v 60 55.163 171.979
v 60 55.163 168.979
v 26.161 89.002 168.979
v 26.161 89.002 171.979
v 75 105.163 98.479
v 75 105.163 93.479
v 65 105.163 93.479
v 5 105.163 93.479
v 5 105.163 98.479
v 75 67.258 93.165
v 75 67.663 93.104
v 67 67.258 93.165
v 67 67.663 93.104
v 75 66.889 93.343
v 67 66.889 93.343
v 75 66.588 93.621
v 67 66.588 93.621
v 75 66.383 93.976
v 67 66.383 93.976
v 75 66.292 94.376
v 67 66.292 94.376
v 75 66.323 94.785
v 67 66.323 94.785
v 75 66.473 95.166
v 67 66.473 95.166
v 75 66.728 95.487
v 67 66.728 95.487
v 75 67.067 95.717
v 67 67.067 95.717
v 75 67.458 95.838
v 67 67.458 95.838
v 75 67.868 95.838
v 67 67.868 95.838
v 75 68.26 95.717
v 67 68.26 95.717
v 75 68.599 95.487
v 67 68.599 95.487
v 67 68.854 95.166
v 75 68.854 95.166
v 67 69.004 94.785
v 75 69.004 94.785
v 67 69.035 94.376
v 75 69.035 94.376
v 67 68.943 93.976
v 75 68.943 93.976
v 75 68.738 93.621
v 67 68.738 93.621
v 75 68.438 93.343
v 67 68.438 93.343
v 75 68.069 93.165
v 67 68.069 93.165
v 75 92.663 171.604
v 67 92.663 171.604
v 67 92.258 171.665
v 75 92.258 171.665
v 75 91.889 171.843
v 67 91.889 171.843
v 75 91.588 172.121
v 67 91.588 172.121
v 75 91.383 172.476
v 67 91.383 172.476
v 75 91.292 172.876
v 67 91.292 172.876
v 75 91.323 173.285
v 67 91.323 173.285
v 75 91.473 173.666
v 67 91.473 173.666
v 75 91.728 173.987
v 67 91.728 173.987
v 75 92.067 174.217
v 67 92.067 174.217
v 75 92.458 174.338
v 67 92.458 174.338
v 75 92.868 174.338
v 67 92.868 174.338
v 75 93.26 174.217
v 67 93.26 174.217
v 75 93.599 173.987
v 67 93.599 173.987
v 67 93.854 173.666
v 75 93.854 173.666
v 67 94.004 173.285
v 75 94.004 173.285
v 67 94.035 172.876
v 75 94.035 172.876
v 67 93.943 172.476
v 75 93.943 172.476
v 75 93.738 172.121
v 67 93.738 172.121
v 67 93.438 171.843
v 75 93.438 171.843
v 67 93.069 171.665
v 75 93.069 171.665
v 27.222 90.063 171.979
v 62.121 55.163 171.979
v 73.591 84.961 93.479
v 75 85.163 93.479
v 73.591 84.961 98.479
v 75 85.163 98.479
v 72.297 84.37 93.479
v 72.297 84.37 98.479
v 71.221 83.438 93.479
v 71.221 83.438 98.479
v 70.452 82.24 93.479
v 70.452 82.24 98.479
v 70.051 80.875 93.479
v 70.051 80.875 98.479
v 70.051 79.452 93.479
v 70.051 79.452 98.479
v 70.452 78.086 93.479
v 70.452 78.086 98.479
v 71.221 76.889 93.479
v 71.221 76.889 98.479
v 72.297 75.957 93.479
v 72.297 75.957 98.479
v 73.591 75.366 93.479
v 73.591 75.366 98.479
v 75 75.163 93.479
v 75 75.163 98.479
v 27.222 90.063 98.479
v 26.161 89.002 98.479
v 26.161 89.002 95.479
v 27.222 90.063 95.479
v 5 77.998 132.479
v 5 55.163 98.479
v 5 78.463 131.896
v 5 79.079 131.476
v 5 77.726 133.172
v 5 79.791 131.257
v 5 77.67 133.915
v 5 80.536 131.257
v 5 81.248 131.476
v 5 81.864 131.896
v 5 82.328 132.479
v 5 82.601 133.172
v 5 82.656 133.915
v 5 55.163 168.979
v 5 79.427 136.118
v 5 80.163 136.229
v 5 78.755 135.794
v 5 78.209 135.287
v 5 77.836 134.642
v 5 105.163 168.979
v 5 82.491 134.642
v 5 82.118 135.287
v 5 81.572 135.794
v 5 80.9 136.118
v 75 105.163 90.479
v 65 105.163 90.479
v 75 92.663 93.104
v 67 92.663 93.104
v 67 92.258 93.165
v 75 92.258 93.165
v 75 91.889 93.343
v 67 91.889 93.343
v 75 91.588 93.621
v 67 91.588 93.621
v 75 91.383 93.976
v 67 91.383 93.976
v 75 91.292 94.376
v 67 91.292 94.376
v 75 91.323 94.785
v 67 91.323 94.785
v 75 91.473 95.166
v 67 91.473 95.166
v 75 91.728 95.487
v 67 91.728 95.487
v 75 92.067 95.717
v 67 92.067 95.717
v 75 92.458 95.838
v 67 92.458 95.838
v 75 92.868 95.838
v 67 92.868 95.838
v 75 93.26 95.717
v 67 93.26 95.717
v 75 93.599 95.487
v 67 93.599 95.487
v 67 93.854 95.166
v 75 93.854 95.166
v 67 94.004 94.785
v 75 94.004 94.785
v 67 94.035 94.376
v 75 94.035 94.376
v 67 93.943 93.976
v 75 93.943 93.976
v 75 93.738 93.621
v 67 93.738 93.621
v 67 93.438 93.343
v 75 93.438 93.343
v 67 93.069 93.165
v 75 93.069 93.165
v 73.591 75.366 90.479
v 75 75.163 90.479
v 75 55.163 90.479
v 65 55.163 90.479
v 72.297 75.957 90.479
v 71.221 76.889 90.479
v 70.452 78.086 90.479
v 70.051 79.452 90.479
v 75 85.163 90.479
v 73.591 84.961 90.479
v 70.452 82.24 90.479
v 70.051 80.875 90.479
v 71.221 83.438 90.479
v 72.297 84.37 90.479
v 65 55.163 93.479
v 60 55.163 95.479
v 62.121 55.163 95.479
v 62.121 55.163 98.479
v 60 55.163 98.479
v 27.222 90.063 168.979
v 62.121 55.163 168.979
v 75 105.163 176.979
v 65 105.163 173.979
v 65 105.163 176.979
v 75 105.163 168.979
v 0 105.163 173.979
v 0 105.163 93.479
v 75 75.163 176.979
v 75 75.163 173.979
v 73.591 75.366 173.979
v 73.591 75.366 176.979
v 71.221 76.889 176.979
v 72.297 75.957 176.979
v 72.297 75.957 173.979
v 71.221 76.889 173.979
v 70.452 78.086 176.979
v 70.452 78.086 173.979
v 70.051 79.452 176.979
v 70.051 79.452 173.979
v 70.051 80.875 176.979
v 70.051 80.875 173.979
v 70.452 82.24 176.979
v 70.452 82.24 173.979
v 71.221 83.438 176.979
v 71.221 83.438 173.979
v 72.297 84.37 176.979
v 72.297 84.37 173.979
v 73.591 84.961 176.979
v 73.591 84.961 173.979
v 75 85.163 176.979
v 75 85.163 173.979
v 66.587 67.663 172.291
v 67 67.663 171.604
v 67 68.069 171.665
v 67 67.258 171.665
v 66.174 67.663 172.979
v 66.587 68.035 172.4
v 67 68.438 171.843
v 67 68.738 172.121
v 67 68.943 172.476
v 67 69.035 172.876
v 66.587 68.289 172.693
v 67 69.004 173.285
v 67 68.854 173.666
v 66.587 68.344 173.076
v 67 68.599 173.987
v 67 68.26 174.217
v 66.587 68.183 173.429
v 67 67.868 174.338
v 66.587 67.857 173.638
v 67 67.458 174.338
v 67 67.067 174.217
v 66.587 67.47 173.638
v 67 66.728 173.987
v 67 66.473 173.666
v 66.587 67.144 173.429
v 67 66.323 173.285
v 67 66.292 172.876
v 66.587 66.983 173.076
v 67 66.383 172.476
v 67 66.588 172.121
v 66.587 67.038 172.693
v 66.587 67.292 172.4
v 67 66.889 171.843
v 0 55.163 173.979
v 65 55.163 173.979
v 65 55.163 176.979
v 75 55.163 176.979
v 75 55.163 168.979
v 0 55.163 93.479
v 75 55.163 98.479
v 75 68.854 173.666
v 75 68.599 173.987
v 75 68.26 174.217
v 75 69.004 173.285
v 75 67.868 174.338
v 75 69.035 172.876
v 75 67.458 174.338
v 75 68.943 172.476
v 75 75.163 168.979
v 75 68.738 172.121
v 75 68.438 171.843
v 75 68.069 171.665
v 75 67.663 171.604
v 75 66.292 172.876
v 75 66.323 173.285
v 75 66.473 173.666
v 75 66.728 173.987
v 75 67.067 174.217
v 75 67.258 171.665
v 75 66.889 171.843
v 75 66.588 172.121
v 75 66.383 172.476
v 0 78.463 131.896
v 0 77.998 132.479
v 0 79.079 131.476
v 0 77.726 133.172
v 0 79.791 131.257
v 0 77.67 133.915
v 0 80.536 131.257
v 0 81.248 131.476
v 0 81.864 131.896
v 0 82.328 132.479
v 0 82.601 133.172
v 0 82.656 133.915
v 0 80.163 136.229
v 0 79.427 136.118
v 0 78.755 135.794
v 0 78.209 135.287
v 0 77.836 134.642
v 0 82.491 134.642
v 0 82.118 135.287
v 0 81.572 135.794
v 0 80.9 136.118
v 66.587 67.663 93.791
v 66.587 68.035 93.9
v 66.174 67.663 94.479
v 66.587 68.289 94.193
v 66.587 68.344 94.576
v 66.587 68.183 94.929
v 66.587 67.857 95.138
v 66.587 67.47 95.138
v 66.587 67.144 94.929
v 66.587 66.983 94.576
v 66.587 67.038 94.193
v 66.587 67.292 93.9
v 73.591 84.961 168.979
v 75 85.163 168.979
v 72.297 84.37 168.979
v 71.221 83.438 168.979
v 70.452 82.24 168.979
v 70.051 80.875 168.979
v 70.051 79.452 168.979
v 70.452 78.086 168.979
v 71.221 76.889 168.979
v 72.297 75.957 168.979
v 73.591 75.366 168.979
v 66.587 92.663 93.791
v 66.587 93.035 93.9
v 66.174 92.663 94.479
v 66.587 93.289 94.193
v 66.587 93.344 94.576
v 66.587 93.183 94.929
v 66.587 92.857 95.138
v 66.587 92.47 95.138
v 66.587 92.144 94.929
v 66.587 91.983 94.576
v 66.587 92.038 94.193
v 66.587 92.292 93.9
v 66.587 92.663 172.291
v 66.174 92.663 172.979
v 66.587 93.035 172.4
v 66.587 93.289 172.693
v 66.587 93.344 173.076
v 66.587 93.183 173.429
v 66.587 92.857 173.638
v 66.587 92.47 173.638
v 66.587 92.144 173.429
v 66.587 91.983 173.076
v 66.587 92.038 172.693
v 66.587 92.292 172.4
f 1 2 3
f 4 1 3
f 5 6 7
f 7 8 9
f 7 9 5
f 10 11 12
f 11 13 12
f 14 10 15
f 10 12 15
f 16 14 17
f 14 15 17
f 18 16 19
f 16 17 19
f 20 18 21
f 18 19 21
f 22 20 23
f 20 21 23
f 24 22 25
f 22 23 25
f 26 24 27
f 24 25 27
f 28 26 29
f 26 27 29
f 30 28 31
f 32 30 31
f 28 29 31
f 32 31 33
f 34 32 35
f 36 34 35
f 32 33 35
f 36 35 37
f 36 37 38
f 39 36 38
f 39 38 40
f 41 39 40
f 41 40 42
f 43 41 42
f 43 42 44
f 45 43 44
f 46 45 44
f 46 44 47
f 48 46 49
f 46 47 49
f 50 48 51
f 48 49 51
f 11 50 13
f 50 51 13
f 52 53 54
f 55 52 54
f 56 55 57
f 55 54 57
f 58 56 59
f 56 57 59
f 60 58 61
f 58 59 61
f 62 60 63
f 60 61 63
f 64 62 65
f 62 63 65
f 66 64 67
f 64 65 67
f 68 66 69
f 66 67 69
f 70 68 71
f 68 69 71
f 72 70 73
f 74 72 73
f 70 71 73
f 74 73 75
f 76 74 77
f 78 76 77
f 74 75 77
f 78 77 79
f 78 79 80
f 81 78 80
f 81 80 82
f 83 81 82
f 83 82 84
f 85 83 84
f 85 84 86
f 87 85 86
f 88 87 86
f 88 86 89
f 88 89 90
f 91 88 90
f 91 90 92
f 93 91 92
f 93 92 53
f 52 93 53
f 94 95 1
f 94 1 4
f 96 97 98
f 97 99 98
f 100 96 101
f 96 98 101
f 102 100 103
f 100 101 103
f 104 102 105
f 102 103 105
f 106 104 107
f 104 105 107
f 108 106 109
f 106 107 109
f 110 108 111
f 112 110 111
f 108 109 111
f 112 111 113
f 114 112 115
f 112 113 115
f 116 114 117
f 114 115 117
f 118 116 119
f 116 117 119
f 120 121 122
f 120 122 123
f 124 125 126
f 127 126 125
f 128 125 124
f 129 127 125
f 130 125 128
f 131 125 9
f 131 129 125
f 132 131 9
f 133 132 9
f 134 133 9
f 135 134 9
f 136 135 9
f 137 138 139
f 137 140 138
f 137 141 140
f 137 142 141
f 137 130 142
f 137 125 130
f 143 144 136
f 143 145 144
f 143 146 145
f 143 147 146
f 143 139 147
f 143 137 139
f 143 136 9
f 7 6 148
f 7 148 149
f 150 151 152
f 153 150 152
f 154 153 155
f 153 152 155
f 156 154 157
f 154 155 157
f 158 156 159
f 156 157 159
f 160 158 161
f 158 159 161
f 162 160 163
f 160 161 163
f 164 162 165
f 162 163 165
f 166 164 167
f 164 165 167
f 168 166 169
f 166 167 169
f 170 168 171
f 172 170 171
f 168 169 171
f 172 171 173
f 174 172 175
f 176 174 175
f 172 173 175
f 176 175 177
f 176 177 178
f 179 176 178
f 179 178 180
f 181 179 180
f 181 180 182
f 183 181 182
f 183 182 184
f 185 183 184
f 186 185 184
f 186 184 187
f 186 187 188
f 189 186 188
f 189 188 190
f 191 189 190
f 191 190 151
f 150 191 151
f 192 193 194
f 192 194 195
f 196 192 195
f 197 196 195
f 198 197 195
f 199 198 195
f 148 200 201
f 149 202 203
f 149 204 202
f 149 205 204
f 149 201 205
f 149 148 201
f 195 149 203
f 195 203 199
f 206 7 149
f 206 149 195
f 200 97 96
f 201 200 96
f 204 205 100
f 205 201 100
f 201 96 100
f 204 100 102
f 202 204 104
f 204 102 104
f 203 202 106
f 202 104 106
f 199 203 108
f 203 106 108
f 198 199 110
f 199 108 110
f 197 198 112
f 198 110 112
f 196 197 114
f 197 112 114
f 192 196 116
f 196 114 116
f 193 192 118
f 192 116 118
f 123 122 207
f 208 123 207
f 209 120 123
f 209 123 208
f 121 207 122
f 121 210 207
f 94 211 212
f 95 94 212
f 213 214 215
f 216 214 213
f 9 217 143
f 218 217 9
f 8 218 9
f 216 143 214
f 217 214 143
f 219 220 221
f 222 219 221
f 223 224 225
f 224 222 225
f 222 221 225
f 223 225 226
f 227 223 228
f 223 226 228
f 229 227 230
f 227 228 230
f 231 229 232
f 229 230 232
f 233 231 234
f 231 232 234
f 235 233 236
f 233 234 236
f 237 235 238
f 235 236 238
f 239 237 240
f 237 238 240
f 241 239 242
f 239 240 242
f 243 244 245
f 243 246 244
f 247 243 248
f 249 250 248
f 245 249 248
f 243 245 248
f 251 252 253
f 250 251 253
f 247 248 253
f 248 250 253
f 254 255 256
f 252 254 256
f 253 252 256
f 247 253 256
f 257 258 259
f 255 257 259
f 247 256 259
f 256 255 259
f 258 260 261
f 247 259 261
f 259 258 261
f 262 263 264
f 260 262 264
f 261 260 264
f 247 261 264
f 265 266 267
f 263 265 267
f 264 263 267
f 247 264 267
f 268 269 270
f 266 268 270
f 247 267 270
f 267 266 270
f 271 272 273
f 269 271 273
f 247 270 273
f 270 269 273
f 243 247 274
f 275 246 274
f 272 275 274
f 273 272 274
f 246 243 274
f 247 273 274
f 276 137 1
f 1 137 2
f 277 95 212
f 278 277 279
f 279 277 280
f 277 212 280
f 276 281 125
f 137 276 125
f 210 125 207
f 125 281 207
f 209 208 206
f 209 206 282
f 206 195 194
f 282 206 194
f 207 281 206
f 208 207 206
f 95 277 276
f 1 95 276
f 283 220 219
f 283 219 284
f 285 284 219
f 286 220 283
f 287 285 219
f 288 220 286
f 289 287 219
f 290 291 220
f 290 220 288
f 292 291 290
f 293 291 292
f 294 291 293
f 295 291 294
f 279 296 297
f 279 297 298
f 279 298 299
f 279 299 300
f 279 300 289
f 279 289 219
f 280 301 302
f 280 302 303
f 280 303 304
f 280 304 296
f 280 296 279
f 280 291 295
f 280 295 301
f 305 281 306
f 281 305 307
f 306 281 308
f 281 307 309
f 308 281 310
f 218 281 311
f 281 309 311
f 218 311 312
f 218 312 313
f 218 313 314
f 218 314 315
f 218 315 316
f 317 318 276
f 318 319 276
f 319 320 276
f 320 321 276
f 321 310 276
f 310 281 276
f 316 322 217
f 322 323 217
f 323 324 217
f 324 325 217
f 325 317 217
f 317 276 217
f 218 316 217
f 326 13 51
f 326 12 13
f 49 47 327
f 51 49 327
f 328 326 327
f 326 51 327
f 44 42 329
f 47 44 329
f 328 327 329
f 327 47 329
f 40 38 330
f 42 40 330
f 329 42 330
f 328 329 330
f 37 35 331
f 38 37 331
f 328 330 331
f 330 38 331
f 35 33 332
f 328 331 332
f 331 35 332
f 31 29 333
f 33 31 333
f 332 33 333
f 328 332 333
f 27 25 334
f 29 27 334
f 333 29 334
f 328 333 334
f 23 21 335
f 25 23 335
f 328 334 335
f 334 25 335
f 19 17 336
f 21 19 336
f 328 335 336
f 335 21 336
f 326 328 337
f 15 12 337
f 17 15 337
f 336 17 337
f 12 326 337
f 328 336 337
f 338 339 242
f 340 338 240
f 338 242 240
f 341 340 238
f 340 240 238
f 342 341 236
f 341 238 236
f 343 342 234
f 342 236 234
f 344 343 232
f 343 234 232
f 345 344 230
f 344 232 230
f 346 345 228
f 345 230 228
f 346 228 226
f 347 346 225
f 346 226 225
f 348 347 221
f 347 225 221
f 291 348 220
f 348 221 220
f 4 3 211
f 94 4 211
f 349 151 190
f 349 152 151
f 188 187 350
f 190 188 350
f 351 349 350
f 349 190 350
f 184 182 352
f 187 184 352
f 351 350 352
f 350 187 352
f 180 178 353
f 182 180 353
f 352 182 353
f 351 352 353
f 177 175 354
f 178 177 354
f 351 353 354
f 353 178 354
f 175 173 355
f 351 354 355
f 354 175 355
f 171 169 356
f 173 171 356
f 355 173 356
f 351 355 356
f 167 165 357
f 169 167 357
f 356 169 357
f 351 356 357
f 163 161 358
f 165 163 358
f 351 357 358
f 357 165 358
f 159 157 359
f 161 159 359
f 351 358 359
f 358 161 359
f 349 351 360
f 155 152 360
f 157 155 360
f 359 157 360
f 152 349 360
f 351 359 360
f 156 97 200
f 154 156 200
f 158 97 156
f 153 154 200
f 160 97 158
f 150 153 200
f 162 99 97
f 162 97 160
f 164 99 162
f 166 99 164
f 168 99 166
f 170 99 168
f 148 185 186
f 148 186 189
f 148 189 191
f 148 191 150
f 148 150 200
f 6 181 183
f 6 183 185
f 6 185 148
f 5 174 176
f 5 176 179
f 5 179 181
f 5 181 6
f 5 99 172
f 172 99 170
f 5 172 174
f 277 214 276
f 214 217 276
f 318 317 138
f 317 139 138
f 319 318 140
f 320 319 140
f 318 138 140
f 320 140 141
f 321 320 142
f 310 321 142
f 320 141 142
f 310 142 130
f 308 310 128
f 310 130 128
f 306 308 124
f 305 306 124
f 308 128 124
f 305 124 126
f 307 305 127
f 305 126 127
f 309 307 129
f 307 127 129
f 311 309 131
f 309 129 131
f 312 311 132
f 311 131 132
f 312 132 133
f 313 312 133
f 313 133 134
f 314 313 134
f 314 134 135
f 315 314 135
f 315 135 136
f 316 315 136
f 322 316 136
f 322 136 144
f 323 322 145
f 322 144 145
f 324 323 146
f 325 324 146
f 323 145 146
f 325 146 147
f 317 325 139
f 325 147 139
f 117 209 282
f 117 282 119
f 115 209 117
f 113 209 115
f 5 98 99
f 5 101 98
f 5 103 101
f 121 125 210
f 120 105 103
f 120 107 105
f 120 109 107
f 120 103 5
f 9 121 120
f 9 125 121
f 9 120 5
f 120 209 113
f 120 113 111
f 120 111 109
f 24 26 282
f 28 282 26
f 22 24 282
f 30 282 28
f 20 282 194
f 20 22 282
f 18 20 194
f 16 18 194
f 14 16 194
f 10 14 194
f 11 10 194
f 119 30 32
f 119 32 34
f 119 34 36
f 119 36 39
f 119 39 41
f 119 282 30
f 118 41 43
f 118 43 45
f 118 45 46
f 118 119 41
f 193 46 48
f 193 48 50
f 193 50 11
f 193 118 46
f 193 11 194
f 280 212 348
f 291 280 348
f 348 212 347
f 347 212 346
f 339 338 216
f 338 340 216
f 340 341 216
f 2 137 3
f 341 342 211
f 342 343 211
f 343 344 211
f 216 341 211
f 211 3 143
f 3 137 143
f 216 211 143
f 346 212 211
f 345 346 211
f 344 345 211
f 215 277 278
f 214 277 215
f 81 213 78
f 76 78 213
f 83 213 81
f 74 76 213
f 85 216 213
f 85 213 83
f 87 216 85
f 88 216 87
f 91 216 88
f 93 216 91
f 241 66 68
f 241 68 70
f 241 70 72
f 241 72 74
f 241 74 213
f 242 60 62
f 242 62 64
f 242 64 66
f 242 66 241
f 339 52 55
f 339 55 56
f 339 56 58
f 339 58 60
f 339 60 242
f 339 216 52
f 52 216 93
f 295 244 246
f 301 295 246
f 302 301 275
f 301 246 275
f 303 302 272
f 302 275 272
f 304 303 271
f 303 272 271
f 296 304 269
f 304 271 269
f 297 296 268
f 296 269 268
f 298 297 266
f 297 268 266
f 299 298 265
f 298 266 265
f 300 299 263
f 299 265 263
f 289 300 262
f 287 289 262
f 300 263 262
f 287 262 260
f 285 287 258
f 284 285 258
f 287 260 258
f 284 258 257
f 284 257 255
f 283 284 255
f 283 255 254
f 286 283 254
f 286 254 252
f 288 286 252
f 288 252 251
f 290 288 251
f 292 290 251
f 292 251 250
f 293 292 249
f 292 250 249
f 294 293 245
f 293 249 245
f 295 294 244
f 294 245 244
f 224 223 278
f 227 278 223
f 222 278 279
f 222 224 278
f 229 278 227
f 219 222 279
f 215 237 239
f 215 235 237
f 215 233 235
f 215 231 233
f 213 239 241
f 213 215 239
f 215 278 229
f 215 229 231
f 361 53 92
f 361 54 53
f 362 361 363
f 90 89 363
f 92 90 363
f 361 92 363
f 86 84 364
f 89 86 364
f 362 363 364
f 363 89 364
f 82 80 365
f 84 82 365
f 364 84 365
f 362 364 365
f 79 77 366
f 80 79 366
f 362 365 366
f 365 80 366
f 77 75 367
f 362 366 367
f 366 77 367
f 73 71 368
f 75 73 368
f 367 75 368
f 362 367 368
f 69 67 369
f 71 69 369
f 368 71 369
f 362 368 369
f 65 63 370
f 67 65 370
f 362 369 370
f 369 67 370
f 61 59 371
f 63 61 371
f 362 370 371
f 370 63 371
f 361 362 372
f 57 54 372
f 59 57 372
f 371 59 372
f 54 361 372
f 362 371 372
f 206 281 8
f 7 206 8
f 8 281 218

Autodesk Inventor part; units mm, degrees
ref_plane "YZ Plane" through (0, 0, 0) normal (1, 0, 0) x (0, 1, 0)
ref_plane "XZ Plane" through (0, 0, 0) normal (0, 1, 0) x (-1, 0, 0)
ref_plane "XY Plane" through (0, 0, 0) normal (0, 0, 1) x (1, 0, 0)
sketch "Skizze1" plane through (0, 0, 0) normal (1, 0, 0) x (0, 1, 0)
  line L0 (105.1634, 173.9786) -> (55.1634, 173.9786)
  line L1 (55.1634, 173.9786) -> (55.1634, 93.4786)
  line L2 (55.1634, 93.4786) -> (105.1634, 93.4786)
  line L3 (105.1634, 93.4786) -> (105.1634, 173.9786)
  point P0 (0, 0)
  dimension "d0" = 80.5
  dimension "d1" = 50
extrude "Extrusion1" add sketch "Skizze1" along normal blind 5
sketch "Skizze2" plane through (5, 0, 0) normal (1, 0, 0) x (0, 0, -1)
  line L0 (-173.9786, 105.1639) -> (-168.9786, 105.1634)
  line L1 (-93.4786, 105.1634) -> (-173.9786, 105.1634) projected
  line L2 (-173.9786, 55.1634) -> (-93.4786, 55.1634) projected
  line L3 (-168.9786, 55.1634) -> (-173.9786, 55.1634)
  line L4 (-173.9786, 55.1634) -> (-173.9786, 105.1639)
  line L5 (-168.9786, 105.1634) -> (-168.9786, 55.1634)
  line L6 (-93.4786, 105.1634) -> (-98.4786, 105.1634)
  line L7 (-98.4786, 55.1634) -> (-93.4786, 55.1634)
  line L8 (-93.4786, 55.1634) -> (-93.4786, 105.1634) projected
  line L9 (-93.4786, 105.1634) -> (-98.4786, 105.1634)
  line L10 (-98.4786, 55.1634) -> (-98.4786, 105.1634)
  line L11 (-98.4786, 105.1634) -> (-93.4786, 105.1634)
  line L12 (-93.4786, 55.1634) -> (-98.4786, 55.1634)
  line L13 (-98.4786, 105.1634) -> (-93.4786, 105.1634)
  line L14 (-93.4786, 55.1634) -> (-98.4786, 55.1634)
  line L15 (-98.4786, 105.1634) -> (-93.4786, 105.1634)
  point P0 (0, 0)
  dimension "d4" = 5
  dimension "d5" = 5
extrude "Extrusion2" add sketch "Skizze2" along normal blind 70 contours L1 L8 L2 L10
sketch "Skizze3" plane through (5, 55.1634, 98.4786) normal (0, 0, 1) x (1, 0, 0)
  line L0 (22.2218, 34.8995) -> (57.5772, -0.4558)
  line L1 (57.5772, -0.4558) -> (56.5165, -1.5165)
  line L2 (56.5165, -1.5165) -> (21.1612, 33.8388)
  line L3 (21.1612, 33.8388) -> (22.2218, 34.8995)
  line L4 (-5, 50) -> (-5, 0) projected
  line L5 (21.1612, 33.8388) -> (38.8388, 16.1612)
  line L6 (0, 50) -> (70, 50) projected
  line L7 (57.5772, -0.4558) -> (56.5165, -1.5165)
  line L8 (56.5165, -1.5165) -> (57.5772, -0.4558)
  line L9 (51.6127, 5.5086) -> (50.5521, 4.4479)
  line L10 (50.5521, 4.4479) -> (56.5165, -1.5165)
  line L11 (57.5772, -0.4558) -> (51.6127, 5.5086)
  point P0 (-5, -55.1634)
  dimension "d8" = 1.5
  dimension "d9" = 50
  dimension "d10" = 45
  dimension "d35" = 16.1612
  dimension "d36" = 26.1612
sketch "Skizze4" plane through (0, 105.1634, 173.9786) normal (0, 1, 0) x (1, 0, 0)
  point P0 (0, 173.9786)
extrude "Extrusion3" cut sketch "Skizze3" against normal blind 3
sketch "Skizze5" plane through (5, 0, 0) normal (1, 0, 0) x (0, 0, -1)
  line L0 (-173.9786, 105.1634) -> (-173.9786, 55.1634) projected
  line L1 (-173.9786, 55.1634) -> (-168.9786, 55.1634)
  line L2 (-173.9786, 55.1634) -> (-98.4786, 55.1634) projected
  line L3 (-98.4786, 105.1634) -> (-173.9786, 105.1634) projected
  line L4 (-168.9786, 105.1634) -> (-173.9786, 105.1634)
  line L5 (-173.9786, 105.1634) -> (-173.9786, 55.1634)
  line L6 (-168.9786, 55.1634) -> (-168.9786, 105.1634)
  point P0 (0, 0)
  dimension "d15" = 5
extrude "Extrusion4" add sketch "Skizze5" along normal blind 70
sketch "Skizze6" plane through (5, 55.1634, 168.9786) normal (0, 0, -1) x (-1, 0, 0)
  line L0 (-57.5772, -0.4558) -> (-56.5165, -1.5165)
  line L1 (-56.5165, -1.5165) -> (-21.1612, 33.8388)
  line L2 (-21.1612, 33.8388) -> (-22.2218, 34.8995)
  line L3 (-22.2218, 34.8995) -> (-57.5772, -0.4558)
  line L4 (0, 50) -> (0, 0) projected
  line L5 (-21.1612, 33.8388) -> (-38.8388, 16.1612)
  line L6 (0, 0) -> (-70, 0) projected
  line L7 (-56.5165, -1.5165) -> (-57.5772, -0.4558)
  line L8 (-53.774, 3.3474) -> (-52.7133, 2.2867)
  line L9 (-52.7133, 2.2867) -> (-56.5165, -1.5165)
  line L10 (-57.5772, -0.4558) -> (-53.774, 3.3474)
  line L11 (0, 50) -> (-70, 50) projected
  point P0 (5, -55.1634)
  dimension "d18" = 1.5
  dimension "d19" = 50
  dimension "d20" = 45
  dimension "d22" = 1.5
  dimension "d37" = 21.1612
  dimension "d38" = 16.1612
extrude "Extrusion5" cut sketch "Skizze6" against normal blind 3
sketch "Skizze7" plane through (75, 0, 0) normal (1, 0, 0) x (0, 0, -1)
  point P0 (0, 0)
sketch "Skizze8" plane through (75, 0, 0) normal (1, 0, 0) x (0, 0, -1)
  point P0 (0, 0)
sketch "Skizze9" plane through (0, 0, 0) normal (-1, 0, 0) x (0, 0, 1)
  line L0 (93.4786, 55.1634) -> (93.4786, 105.1634) projected
  line L1 (93.4786, 105.1634) -> (173.9786, 105.1634) projected
  point P0 (0, 0)
  point P1 (133.7286, 80.1634)
  dimension "d26" = 40.25
  dimension "d27" = 25
hole "Bohrung1" at (0, 80.1634, 133.7286) direction (1, 0, 0) diameter 5 end through all
sketch "Skizze10" plane through (5, 55.1634, 98.4786) normal (0, 0, 1) x (1, 0, 0)
  point P0 (-5, -55.1634)
sketch "Skizze11" plane through (75, 0, 0) normal (1, 0, 0) x (0, 0, -1)
  point P0 (0, 0)
sketch "Skizze12" plane through (0, 55.1634, 173.9786) normal (0, 0, 1) x (1, 0, 0)
  line L0 (75, 50) -> (75, 0) projected
  circle A0 centre (75, 25) radius 5
  point P0 (0, -55.1634)
  dimension "d39" = 10
extrude "Extrusion6" cut sketch "Skizze12" against normal through all
sketch "Skizze13" plane through (0, 55.1634, 93.4786) normal (0, 0, -1) x (-1, 0, 0)
  line L0 (-75, 30) -> (-75, 50) projected
  line L1 (-62.1213, 0) -> (-75, 0) projected
  line L2 (-75, 50) -> (-65, 50)
  line L3 (-65, 50) -> (-65, 0)
  line L4 (-65, 0) -> (-75, 0)
  arc A0 (-75, 20) -> (-75, 30) centre (-75, 25) ccw
  line L5 (-75, 0) -> (-75, 20)
  line L6 (-75, 30) -> (-75, 50)
  point P0 (0, -55.1634)
  dimension "d42" = 10
extrude "Extrusion7" add sketch "Skizze13" along normal blind 3
sketch "Skizze14" plane through (0, 55.1634, 173.9786) normal (0, 0, 1) x (1, 0, 0)
  line L0 (62.1213, 0) -> (75, 0) projected
  line L1 (5, 50) -> (75, 50) projected
  line L2 (75, 0) -> (65, 0)
  line L3 (65, 0) -> (65, 50)
  line L4 (65, 50) -> (75, 50)
  arc A0 (75, 30) -> (75, 20) centre (75, 25) ccw projected
  arc A1 (75, 30) -> (75, 20) centre (75, 25) ccw
  line L5 (75, 50) -> (75, 30)
  line L6 (75, 20) -> (75, 0)
  point P0 (0, -55.1634)
  dimension "d45" = 10
extrude "Extrusion8" add sketch "Skizze14" along normal blind 3
sketch "Skizze15" plane through (75, 0, 0) normal (1, 0, 0) x (0, 0, -1)
  line L0 (-176.9786, 55.1634) -> (-176.9786, 75.1634) projected
  line L1 (-176.9786, 85.1634) -> (-176.9786, 105.1634) projected
  line L2 (-168.9786, 75.1634) -> (-176.9786, 75.1634) projected
  point P0 (0, 0)
  point P1 (-172.9786, 67.6634)
  point P2 (-172.9786, 92.6634)
  dimension "d48" = 4
  dimension "d49" = 4
  dimension "d50" = 25
  dimension "d51" = 7.5
sketch "Skizze16" plane through (75, 0, 0) normal (1, 0, 0) x (0, 0, -1)
  line L0 (-90.4786, 105.1634) -> (-90.4786, 85.1634) projected
  line L1 (-90.4786, 75.1634) -> (-90.4786, 55.1634) projected
  line L2 (-90.4786, 75.1634) -> (-98.4786, 75.1634) projected
  point P0 (0, 0)
  point P1 (-94.4786, 67.6634)
  point P2 (-94.4786, 92.6634)
  dimension "d52" = 25
  dimension "d53" = 4
  dimension "d54" = 4
  dimension "d55" = 7.5
sketch "Skizze17" plane through (75, 0, 0) normal (1, 0, 0) x (0, 0, -1)
  point P0 (0, 0)
hole "Bohrung2" at (75, 92.6634, 94.4786) at (75, 67.6634, 94.4786) direction (-1, 0, 0) diameter 2.75 depth 8 tip angle 118
hole "Bohrung3" at (75, 67.6634, 172.9786) at (75, 92.6634, 172.9786) direction (-1, 0, 0) diameter 2.75 depth 8 tip angle 118
properties part number "Spiegelhalter Objekthalter 1"
